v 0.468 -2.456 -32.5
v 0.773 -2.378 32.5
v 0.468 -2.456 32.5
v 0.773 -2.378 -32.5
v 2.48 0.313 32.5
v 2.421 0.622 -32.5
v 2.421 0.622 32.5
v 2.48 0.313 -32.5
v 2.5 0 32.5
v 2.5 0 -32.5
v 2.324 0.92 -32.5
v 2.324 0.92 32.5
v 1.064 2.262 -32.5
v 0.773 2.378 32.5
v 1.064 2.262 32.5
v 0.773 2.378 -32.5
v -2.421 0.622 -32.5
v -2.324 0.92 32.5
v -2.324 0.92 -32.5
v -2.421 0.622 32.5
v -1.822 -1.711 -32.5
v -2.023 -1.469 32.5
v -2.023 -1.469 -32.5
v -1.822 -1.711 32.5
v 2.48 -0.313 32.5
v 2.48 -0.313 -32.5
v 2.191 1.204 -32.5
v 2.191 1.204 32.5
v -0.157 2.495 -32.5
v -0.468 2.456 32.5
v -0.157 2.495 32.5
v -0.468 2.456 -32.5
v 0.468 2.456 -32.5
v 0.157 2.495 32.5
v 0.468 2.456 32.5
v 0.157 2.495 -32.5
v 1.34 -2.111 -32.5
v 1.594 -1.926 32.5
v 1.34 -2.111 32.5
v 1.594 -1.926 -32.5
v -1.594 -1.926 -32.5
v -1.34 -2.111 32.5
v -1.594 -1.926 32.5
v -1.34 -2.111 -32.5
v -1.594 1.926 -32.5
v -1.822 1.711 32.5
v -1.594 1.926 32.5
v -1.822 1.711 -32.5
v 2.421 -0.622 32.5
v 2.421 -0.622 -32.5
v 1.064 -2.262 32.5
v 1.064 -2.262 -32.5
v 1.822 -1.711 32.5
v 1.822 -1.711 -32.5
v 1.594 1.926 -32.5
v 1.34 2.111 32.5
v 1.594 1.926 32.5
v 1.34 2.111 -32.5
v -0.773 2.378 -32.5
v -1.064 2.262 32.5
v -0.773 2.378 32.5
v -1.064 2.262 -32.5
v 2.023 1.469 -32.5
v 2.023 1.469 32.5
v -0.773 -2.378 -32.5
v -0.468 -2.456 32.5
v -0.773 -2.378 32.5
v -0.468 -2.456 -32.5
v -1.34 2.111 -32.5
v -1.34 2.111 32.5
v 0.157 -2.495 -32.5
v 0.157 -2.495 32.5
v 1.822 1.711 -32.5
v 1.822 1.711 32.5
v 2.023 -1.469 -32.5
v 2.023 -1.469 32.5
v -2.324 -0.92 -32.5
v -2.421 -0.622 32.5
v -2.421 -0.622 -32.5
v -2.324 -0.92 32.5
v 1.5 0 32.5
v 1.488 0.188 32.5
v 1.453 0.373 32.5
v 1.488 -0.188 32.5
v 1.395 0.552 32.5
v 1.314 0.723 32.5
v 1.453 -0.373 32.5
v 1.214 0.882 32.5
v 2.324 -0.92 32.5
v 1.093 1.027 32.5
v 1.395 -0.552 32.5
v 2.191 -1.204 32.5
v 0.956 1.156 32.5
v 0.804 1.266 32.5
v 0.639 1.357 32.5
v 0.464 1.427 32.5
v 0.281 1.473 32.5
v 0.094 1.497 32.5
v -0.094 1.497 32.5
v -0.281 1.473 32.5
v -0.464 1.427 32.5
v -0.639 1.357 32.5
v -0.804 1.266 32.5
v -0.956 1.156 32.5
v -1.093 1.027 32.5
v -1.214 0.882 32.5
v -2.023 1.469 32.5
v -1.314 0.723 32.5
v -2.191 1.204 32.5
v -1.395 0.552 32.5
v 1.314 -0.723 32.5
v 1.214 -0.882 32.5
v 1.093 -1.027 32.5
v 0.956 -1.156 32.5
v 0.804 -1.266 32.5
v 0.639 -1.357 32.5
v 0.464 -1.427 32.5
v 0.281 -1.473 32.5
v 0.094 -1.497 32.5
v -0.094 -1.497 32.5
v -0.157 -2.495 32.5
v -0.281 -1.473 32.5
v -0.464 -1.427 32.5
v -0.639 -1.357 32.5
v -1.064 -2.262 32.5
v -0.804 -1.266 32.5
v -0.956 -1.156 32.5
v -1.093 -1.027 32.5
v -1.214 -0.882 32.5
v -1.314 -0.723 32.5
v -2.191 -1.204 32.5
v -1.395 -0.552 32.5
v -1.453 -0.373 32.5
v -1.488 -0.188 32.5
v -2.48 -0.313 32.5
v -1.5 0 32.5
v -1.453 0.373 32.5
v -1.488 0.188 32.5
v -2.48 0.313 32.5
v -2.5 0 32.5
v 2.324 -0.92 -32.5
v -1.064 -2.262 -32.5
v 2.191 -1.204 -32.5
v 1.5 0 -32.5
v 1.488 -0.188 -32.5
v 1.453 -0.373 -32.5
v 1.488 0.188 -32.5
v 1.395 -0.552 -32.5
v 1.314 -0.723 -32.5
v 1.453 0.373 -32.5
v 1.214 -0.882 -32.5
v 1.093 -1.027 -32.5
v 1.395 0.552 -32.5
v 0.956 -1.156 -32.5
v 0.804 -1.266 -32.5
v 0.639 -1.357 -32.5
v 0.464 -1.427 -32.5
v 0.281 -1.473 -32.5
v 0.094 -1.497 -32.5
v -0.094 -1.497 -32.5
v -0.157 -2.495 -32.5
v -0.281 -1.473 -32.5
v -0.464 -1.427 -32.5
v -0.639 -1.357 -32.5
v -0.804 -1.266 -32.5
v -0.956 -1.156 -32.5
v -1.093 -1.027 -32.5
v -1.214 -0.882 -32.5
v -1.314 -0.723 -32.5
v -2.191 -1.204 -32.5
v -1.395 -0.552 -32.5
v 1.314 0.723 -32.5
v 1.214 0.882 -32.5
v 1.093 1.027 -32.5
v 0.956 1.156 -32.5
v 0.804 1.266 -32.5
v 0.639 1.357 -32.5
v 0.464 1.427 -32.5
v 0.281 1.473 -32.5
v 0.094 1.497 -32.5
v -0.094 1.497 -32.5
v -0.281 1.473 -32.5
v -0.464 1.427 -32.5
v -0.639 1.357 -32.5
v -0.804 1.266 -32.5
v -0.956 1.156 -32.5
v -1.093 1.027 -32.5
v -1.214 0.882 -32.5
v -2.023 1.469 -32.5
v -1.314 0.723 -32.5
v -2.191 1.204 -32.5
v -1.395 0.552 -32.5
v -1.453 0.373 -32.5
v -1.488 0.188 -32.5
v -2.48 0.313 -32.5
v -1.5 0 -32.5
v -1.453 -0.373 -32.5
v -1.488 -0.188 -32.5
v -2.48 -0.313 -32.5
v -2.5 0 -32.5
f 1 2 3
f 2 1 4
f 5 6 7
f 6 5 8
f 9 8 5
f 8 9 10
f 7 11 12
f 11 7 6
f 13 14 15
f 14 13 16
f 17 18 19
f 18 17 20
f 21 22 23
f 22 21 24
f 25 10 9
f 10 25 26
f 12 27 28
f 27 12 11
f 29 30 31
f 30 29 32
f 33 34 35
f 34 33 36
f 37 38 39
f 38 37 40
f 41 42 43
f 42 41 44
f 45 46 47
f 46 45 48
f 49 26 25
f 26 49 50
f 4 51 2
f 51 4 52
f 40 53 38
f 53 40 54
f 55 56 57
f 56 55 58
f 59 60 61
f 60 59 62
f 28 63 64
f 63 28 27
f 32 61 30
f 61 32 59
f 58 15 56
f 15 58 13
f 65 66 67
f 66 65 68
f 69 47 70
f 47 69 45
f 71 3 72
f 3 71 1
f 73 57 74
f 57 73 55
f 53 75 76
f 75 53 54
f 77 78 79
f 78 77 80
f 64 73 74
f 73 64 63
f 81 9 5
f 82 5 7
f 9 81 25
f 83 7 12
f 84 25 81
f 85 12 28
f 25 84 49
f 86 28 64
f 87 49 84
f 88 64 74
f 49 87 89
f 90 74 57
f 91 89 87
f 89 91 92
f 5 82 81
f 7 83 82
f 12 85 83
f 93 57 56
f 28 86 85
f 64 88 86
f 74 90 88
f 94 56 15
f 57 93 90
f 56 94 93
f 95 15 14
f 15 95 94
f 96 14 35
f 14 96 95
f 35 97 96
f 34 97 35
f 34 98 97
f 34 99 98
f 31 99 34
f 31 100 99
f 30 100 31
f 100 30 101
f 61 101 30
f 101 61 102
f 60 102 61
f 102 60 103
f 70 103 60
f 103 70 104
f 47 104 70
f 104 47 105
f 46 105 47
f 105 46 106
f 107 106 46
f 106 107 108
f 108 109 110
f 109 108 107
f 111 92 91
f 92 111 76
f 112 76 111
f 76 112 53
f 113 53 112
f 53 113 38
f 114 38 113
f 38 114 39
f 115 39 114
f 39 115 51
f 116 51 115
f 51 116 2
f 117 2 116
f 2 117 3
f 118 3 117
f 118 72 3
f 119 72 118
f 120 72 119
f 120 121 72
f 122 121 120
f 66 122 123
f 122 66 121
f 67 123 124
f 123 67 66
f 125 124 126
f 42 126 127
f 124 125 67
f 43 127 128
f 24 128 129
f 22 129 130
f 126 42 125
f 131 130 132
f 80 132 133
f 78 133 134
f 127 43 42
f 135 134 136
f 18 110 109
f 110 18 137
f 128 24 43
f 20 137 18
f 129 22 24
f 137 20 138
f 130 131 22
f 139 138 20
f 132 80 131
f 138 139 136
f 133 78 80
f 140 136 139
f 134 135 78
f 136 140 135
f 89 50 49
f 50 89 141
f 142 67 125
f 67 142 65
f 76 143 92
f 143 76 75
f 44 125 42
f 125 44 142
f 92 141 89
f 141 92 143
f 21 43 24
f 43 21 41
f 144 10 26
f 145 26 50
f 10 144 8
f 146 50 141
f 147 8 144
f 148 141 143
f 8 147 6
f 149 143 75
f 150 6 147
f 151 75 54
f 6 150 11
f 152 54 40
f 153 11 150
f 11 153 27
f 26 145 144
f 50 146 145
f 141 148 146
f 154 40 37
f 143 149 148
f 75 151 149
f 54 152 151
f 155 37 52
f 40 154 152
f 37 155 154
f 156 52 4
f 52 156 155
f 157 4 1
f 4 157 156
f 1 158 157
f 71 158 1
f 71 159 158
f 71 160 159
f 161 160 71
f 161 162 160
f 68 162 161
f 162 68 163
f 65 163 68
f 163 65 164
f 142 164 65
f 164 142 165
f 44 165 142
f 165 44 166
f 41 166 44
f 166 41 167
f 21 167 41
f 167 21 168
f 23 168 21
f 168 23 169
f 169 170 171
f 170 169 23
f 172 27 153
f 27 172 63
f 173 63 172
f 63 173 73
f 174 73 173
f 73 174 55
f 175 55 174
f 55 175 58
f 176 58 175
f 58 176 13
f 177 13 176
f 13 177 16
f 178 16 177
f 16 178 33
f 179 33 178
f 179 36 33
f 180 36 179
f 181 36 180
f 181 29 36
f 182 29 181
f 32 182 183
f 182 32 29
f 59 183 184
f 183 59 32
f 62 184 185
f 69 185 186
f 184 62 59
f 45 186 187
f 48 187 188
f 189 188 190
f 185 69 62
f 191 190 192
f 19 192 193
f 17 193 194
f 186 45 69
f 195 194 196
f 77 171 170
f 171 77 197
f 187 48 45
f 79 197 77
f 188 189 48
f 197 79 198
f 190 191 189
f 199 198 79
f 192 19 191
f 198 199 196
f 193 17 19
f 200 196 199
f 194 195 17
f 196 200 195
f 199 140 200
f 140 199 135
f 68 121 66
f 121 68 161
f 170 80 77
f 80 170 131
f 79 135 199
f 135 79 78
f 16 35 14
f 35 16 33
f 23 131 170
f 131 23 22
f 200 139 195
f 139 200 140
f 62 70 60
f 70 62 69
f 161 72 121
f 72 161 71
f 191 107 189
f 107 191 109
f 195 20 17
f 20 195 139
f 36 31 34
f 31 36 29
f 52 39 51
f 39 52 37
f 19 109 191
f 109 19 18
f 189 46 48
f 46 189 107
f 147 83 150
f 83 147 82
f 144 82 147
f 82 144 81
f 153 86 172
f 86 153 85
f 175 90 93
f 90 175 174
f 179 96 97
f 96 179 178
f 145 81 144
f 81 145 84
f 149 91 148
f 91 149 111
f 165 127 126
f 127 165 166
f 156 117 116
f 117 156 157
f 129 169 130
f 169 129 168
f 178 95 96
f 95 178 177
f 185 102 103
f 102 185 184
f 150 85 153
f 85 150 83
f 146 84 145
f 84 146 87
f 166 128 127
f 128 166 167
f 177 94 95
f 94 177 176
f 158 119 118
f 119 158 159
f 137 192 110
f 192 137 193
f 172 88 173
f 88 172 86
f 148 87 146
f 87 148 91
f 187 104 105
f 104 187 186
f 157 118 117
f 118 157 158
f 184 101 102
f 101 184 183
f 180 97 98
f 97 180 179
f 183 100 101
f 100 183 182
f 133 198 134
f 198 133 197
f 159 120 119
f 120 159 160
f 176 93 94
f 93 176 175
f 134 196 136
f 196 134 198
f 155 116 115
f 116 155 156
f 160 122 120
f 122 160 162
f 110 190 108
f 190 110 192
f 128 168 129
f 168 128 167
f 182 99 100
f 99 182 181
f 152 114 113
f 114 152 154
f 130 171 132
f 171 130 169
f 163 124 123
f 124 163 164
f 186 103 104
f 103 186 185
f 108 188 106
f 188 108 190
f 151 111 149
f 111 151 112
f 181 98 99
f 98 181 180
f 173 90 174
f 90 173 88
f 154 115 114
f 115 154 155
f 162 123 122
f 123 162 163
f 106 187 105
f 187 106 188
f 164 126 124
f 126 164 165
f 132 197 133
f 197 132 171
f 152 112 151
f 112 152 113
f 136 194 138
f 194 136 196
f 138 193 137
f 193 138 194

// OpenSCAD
$fn = 50;


difference() {
	union() {
		translate(v = [0, 0, -32.5000000000]) {
			cylinder(h = 65, r = 2.5000000000);
		}
	}
	union() {
		translate(v = [0, 0, -100.0000000000]) {
			cylinder(h = 200, r = 1.5000000000);
		}
	}
}
